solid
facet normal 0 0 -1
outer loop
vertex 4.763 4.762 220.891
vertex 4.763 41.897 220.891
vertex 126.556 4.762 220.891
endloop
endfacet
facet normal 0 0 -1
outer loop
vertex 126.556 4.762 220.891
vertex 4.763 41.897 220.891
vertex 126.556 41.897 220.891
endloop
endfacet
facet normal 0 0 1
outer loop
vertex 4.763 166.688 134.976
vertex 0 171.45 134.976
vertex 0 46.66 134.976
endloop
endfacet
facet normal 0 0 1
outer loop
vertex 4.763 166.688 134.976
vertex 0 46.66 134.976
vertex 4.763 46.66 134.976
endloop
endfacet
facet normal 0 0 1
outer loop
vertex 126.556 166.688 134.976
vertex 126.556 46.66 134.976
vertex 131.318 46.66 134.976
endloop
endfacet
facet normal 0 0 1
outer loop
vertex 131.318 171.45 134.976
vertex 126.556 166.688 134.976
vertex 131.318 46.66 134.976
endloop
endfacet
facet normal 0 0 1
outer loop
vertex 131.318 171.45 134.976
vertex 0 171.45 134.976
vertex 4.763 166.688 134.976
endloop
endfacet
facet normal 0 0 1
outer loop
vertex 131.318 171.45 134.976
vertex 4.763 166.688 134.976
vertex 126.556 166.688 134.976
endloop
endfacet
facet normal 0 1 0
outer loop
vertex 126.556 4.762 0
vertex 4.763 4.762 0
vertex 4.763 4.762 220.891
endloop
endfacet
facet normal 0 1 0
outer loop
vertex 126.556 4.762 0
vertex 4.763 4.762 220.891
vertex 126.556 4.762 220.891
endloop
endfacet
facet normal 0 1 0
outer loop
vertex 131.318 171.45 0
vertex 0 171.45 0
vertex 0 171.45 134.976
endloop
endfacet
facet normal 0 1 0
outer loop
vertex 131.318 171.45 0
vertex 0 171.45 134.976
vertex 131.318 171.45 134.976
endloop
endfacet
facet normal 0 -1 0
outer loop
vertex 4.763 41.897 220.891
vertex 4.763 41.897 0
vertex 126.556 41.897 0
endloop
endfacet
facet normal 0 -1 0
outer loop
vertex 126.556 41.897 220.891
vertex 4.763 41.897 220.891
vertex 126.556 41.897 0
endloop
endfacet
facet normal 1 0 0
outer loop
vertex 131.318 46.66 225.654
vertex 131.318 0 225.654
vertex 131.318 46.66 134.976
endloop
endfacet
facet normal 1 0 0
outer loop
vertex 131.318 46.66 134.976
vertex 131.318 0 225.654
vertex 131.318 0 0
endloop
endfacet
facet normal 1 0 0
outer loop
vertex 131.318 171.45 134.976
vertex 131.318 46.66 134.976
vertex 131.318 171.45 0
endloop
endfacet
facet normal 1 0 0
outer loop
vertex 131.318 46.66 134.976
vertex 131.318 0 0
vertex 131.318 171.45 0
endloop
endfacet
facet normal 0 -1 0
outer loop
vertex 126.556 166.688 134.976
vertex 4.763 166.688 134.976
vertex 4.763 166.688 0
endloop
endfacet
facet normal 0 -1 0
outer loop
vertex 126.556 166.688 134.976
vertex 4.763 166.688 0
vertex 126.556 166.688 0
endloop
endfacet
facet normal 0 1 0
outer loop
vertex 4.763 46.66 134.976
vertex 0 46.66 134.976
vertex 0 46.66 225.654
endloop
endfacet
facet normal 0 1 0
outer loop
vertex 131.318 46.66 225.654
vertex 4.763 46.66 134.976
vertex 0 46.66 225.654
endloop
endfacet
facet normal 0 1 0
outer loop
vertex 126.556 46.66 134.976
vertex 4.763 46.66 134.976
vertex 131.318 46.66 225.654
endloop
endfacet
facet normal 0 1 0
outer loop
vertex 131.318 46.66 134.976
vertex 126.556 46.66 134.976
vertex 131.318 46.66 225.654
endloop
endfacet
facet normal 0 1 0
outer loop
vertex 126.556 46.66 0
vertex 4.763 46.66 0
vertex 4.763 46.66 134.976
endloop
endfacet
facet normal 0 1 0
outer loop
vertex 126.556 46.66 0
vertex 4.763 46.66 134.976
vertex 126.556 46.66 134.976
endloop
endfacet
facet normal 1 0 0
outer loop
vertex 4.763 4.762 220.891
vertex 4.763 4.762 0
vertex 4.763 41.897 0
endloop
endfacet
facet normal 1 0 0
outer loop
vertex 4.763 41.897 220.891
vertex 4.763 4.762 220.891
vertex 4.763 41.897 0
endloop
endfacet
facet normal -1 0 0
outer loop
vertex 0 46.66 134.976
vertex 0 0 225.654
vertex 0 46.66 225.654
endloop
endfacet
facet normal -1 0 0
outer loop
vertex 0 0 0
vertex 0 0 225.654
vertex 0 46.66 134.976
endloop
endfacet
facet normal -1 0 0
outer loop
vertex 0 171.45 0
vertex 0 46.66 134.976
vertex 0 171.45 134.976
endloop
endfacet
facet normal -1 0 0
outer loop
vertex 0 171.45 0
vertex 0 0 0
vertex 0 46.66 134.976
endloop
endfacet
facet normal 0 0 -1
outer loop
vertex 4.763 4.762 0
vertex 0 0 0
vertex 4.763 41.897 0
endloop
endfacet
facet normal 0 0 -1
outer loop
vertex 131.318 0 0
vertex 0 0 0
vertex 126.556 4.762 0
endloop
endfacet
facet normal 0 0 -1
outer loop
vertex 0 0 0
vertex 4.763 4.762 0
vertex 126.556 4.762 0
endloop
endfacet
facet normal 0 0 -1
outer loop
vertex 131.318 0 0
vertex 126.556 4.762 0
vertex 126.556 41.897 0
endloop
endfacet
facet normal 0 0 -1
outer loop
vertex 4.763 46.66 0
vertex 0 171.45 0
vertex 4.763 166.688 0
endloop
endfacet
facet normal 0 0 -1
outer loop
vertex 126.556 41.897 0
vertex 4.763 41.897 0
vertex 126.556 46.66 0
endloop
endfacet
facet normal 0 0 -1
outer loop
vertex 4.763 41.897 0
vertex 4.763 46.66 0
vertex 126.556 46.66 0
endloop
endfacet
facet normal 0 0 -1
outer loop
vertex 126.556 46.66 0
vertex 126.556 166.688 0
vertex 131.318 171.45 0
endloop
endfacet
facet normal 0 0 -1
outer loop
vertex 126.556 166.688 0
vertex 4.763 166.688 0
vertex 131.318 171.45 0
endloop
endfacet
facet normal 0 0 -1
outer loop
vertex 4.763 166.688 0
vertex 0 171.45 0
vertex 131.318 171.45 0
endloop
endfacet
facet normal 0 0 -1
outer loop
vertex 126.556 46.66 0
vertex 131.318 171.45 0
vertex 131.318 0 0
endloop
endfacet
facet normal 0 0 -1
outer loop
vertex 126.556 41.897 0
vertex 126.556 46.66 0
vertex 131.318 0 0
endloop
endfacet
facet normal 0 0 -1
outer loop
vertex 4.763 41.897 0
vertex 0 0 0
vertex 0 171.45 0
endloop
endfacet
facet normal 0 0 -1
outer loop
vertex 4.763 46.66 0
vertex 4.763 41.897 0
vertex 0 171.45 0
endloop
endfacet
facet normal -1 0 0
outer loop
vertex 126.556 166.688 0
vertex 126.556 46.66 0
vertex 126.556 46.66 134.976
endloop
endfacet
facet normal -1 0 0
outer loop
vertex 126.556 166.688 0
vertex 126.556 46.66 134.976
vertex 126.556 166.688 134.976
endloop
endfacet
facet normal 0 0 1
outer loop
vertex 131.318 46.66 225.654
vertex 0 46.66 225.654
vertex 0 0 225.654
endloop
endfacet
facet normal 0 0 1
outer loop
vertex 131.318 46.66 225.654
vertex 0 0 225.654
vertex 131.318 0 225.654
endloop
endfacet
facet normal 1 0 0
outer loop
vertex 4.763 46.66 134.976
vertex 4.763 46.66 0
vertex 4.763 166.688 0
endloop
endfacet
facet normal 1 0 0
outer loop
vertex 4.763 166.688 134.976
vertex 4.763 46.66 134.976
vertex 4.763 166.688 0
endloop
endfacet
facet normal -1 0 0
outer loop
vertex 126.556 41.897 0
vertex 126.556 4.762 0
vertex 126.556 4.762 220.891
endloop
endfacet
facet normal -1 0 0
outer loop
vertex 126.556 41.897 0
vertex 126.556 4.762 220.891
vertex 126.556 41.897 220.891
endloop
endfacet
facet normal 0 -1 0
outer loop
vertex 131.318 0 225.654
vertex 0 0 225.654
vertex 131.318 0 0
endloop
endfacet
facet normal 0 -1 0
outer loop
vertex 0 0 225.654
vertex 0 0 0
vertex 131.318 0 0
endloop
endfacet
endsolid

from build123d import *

# Parameters (mm, degrees)
SKETCH1_W           = 131.318
SKETCH1_H           = 171.45
BOSS_EXTRUDE1_DEPTH = 134.9756
SKETCH2_W           = 131.318
SKETCH2_H           = 46.6598
BOSS_EXTRUDE2_DEPTH = 90.678
SHELL1_OUTLINE_W    = 121.793
SHELL1_OUTLINE_H    = 161.925
SHELL1_DEPTH        = 134.9756
SHELL1_START        = 134.9756
SHELL1_2_OUTLINE_W  = 121.793
SHELL1_2_OUTLINE_H  = 37.1348
SHELL1_2_DEPTH      = 85.9155
SKETCH3_W           = 131.318
SKETCH3_H           = 134.9756
BOSS_EXTRUDE3_DEPTH = 4.7625


# Read off the part's stored shape, not the designer's step: Shell1
with BuildPart() as part:
    # Sketch1 → Boss-Extrude1 (new body)
    with BuildSketch(Plane.XY):
        with Locations((65.659, 85.725)):
            Rectangle(SKETCH1_W, SKETCH1_H)
    extrude(amount=BOSS_EXTRUDE1_DEPTH)

    # Sketch2 → Boss-Extrude2 (add)
    with BuildSketch(Plane.XY.offset(134.9756)):
        with Locations((65.659, 23.3299)):
            Rectangle(SKETCH2_W, SKETCH2_H)
    extrude(amount=BOSS_EXTRUDE2_DEPTH)

    # Shell1 outline → Shell1 (cut)
    with BuildSketch(Plane.XY):
        with Locations((65.659, 85.725)):
            Rectangle(SHELL1_OUTLINE_W, SHELL1_OUTLINE_H)
    extrude(amount=SHELL1_DEPTH, mode=Mode.SUBTRACT)

    # Shell1 2 outline → Shell1 2 (cut)
    with BuildSketch(Plane.XY.offset(SHELL1_START)):
        with Locations((65.659, 23.3299)):
            Rectangle(SHELL1_2_OUTLINE_W, SHELL1_2_OUTLINE_H)
    extrude(amount=SHELL1_2_DEPTH, mode=Mode.SUBTRACT)

    # Sketch3 → Boss-Extrude3 (add)
    with BuildSketch(Plane(origin=(0, 46.6598, 0), x_dir=(1, 0, 0), z_dir=(0, 1, 0))):
        with Locations((65.659, -67.4878)):
            Rectangle(SKETCH3_W, SKETCH3_H)
    extrude(amount=-BOSS_EXTRUDE3_DEPTH)


solid = part.part
